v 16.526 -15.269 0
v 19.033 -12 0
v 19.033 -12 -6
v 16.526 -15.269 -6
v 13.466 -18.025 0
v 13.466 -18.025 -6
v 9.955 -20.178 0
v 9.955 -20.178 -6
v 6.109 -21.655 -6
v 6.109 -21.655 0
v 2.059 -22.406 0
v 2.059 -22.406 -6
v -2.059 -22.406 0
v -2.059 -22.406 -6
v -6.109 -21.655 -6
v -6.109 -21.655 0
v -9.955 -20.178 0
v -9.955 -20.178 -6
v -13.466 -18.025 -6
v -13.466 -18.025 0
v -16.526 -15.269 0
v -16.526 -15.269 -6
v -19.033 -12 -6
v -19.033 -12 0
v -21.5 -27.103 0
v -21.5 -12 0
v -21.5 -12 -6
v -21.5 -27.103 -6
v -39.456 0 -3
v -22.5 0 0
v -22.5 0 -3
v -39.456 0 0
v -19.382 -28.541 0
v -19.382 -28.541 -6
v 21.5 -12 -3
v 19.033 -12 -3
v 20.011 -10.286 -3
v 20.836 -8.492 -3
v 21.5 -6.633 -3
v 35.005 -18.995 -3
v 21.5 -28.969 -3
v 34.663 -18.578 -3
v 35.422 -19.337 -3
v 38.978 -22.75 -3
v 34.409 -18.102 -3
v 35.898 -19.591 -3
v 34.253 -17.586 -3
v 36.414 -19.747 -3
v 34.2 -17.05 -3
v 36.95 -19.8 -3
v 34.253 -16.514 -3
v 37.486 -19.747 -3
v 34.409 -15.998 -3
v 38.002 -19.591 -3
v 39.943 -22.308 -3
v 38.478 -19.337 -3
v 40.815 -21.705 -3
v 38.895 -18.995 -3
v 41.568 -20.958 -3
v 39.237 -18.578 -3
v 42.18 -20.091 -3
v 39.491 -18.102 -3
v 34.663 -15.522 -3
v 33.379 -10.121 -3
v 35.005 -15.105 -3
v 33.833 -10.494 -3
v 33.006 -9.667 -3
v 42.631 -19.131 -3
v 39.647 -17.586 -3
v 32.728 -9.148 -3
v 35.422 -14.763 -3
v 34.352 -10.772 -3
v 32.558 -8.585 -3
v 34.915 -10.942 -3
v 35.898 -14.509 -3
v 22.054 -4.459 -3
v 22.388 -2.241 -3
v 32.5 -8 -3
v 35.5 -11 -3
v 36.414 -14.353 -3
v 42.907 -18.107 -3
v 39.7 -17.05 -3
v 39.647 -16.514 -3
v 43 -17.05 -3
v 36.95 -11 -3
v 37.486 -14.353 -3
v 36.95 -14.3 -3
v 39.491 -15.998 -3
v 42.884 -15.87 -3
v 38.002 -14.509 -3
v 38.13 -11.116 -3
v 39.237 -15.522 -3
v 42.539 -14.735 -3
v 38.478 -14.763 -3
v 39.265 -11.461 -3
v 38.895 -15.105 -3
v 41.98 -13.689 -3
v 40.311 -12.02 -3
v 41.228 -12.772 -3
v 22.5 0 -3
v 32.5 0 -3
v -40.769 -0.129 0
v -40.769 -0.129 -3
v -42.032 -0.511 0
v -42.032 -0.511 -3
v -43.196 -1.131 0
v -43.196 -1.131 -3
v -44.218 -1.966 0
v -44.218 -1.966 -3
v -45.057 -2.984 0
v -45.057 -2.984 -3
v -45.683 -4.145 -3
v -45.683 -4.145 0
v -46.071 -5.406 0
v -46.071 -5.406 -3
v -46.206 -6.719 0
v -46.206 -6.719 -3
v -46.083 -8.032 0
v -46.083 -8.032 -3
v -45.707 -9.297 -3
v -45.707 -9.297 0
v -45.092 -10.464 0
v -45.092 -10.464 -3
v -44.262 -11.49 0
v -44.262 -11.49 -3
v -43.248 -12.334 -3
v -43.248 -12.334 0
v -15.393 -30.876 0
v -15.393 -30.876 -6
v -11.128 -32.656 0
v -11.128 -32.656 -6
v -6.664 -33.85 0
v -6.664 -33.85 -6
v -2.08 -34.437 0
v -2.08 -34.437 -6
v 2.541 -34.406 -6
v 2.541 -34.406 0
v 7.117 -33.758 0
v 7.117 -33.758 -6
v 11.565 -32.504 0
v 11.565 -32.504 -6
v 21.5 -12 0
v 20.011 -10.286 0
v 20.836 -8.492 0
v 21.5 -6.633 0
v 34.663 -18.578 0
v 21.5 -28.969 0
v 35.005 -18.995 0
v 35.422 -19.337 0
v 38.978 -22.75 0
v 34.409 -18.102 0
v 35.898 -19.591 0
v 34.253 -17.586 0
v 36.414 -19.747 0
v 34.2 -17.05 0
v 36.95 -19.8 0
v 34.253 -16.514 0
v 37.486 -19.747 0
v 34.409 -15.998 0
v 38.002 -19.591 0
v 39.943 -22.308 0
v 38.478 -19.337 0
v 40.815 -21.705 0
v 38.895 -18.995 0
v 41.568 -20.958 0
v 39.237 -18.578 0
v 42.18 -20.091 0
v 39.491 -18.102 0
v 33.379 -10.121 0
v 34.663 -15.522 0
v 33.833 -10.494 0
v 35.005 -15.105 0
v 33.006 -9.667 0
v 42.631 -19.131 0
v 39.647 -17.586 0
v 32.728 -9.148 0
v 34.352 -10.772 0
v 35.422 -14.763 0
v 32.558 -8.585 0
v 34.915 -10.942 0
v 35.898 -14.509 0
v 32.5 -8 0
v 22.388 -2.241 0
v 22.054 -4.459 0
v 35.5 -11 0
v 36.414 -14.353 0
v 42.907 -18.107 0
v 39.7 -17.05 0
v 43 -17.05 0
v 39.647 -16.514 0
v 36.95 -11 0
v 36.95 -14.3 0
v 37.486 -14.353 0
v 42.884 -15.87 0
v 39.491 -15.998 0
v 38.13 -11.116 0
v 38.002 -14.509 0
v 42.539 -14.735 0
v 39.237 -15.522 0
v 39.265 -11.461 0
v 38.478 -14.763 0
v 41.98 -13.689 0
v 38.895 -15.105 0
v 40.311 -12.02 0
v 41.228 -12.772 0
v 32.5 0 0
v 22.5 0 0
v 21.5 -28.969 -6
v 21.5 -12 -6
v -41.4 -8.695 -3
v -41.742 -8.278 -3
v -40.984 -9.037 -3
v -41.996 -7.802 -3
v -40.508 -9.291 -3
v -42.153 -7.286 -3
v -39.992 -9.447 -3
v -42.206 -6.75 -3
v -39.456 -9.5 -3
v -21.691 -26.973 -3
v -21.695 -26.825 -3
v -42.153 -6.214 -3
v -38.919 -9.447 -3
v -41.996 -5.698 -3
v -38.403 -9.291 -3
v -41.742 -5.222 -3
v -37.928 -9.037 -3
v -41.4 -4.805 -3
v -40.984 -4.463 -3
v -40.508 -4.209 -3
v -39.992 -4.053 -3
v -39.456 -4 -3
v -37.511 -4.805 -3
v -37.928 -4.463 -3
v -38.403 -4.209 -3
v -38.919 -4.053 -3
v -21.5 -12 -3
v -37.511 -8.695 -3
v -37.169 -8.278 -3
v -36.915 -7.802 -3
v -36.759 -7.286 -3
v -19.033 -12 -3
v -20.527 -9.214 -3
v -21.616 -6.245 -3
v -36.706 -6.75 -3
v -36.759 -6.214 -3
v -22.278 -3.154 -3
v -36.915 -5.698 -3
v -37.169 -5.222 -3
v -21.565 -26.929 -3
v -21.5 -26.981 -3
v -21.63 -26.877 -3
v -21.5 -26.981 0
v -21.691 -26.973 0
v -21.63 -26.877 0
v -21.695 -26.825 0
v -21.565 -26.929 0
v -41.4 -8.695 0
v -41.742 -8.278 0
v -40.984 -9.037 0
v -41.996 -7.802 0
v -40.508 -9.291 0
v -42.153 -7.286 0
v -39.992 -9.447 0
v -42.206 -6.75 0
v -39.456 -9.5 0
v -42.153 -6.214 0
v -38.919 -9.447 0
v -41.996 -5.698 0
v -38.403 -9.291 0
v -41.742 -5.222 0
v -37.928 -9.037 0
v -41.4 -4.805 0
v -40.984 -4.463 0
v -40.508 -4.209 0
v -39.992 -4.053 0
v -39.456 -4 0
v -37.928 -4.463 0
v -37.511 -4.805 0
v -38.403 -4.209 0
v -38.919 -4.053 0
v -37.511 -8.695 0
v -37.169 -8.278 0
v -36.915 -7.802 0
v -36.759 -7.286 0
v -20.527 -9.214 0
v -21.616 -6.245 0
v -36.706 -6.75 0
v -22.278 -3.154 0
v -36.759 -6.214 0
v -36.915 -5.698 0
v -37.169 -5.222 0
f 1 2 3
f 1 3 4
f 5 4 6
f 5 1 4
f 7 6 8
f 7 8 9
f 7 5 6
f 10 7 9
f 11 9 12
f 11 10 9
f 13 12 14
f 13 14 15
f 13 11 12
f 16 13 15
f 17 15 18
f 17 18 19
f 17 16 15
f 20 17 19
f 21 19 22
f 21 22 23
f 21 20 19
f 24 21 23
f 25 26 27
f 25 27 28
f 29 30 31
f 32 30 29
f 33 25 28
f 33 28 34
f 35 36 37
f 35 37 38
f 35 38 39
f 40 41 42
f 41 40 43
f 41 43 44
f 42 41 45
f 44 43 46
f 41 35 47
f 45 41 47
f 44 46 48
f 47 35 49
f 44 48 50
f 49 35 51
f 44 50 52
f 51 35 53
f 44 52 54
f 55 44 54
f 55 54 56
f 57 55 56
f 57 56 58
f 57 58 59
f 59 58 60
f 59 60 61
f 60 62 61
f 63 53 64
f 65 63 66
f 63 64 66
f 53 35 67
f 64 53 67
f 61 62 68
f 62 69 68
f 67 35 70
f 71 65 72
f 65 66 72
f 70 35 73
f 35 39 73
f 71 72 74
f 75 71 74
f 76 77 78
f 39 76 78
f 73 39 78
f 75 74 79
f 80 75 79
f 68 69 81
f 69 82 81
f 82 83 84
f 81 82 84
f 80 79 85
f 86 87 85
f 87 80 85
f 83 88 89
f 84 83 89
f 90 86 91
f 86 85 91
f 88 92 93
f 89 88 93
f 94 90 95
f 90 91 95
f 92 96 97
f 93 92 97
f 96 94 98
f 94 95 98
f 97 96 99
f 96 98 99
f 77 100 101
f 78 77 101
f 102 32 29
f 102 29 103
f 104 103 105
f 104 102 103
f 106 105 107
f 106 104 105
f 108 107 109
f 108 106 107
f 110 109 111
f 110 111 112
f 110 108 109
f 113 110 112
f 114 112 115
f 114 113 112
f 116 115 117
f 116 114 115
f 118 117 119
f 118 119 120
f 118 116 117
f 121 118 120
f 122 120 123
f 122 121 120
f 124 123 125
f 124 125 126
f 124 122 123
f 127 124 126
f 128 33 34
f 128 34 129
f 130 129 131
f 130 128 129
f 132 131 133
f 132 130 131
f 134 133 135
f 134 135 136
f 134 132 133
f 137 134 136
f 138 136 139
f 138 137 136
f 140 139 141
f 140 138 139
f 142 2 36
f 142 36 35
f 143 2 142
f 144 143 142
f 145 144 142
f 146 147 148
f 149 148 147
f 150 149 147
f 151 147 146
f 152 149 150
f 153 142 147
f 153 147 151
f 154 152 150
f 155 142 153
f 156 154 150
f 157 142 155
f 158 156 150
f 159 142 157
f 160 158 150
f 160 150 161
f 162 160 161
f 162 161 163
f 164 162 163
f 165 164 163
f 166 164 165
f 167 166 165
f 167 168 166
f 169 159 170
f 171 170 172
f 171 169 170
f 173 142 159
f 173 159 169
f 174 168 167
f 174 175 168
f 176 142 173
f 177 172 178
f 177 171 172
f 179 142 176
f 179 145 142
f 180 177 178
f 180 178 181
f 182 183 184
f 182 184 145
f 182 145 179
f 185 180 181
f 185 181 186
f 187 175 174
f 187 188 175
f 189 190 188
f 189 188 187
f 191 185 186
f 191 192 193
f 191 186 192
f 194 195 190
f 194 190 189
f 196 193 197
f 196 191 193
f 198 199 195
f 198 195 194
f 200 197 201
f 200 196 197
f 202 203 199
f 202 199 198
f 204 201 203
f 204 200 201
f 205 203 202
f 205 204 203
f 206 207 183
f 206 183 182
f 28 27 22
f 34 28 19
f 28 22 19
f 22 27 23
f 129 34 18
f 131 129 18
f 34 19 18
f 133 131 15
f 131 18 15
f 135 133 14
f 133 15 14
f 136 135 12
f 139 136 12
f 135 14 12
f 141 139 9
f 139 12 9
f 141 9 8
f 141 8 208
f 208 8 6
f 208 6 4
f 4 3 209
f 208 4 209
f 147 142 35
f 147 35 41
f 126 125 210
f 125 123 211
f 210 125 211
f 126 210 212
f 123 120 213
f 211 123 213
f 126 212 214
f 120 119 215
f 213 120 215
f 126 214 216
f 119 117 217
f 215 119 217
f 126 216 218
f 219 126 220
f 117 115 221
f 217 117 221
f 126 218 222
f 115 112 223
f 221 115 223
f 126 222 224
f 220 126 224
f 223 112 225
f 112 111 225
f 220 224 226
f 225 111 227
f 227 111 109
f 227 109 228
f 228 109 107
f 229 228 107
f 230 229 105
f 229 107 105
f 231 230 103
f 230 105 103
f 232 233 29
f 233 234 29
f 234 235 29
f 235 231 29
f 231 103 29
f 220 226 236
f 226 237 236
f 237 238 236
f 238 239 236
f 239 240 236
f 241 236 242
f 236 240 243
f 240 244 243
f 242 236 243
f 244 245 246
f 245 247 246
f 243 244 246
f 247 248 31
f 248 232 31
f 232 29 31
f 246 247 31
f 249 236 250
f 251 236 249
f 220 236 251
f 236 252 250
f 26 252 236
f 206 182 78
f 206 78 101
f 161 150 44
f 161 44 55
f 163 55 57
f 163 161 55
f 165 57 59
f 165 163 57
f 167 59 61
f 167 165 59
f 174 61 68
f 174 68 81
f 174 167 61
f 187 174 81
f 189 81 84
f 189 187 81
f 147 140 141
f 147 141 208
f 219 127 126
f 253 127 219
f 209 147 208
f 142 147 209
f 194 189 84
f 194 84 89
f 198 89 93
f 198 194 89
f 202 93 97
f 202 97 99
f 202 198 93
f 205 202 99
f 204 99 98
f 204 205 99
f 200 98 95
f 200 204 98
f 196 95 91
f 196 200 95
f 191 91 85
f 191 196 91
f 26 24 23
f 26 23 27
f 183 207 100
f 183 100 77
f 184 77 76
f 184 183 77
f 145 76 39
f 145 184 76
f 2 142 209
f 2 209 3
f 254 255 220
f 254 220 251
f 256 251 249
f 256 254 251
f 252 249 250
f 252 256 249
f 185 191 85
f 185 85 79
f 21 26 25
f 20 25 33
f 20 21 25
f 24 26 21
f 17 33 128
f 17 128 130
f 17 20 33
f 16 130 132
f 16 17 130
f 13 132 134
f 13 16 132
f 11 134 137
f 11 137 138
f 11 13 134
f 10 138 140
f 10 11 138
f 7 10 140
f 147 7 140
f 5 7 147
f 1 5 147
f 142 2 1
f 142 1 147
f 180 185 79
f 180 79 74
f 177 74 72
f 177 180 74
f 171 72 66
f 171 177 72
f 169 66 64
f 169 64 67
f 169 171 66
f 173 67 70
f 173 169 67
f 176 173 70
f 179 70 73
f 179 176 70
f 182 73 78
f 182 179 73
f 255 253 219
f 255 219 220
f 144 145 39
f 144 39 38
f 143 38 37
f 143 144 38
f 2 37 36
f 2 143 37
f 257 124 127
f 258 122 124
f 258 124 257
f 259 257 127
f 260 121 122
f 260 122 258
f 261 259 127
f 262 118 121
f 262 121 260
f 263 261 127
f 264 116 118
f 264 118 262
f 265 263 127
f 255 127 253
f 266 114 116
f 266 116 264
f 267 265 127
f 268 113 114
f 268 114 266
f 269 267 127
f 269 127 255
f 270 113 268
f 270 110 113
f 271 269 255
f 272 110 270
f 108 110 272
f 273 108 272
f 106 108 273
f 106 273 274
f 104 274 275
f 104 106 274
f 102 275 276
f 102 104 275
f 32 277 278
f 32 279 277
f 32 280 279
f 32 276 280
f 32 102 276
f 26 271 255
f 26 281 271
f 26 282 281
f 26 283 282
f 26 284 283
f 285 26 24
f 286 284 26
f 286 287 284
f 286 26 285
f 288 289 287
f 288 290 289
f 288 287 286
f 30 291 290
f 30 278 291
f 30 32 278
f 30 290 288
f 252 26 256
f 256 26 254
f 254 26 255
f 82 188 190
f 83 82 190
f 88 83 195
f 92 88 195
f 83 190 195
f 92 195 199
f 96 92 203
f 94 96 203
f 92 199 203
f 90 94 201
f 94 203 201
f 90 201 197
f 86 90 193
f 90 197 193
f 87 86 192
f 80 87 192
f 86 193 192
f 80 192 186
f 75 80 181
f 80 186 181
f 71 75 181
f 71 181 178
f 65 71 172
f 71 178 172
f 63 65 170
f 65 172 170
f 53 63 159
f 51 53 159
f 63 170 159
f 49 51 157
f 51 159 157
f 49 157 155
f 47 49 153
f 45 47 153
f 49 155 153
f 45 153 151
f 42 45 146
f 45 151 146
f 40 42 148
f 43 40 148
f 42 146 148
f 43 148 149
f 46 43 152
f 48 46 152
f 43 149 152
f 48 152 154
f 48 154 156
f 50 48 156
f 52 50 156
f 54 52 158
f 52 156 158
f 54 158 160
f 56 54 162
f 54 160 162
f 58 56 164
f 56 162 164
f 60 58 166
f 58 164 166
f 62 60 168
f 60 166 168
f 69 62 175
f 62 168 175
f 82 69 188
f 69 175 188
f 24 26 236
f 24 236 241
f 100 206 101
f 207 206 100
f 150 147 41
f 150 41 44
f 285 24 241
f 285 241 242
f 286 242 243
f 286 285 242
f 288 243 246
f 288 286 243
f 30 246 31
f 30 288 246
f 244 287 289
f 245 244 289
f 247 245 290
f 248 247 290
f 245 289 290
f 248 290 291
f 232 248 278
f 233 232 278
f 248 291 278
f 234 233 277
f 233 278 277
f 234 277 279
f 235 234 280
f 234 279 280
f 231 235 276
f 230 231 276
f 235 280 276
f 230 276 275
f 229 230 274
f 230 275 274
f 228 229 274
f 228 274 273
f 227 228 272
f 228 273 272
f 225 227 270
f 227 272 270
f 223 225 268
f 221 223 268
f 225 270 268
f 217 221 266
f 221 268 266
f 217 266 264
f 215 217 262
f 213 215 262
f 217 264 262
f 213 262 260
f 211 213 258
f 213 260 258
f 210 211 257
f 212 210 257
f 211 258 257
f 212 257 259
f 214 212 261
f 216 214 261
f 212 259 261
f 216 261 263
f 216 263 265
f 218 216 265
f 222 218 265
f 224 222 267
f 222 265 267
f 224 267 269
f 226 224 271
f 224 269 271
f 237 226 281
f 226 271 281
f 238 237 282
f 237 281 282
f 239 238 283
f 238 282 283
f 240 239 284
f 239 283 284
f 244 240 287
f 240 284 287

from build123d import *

# Parameters (mm, degrees)
F0_R     = 2.75
F1_DEPTH = 3
F2_DEPTH = 6


# Not quite as in the source:
# - a feature names something its author has since deleted; it is built from what else it names


with BuildPart() as f1:
    # F0 (on Top) → F1 (new body)
    with BuildSketch(Plane.XY):
        with BuildLine():
            ThreePointArc((-33.2160406839, -9.3244110423), (-34.0059545463, -5.8176503326), (-34.4267003209, -2.2477333057))
            ThreePointArc((-34.4267003209, -2.2477333057), (-36.7015374081, -0.5875004995), (-39.4558249578, 0))
            ThreePointArc((-39.4558249578, 0), (-45.9077806089, -4.7663749659), (-43.2479022167, -12.334142733))
            ThreePointArc((-43.2479022167, -12.334142733), (-37.5161243055, -13.215296697), (-33.2160406839, -9.3244110423))
        make_face()
        with Locations((-39.4558249578, -6.75)):
            Circle(F0_R, mode=Mode.SUBTRACT)
        with BuildLine():
            ThreePointArc((-21.6952147359, -26.8247582946), (-28.8162633149, -18.9703180935), (-33.2160406839, -9.3244110423))
            ThreePointArc((-33.2160406839, -9.3244110423), (-37.5161243055, -13.215296697), (-43.2479022167, -12.334142733))
            Line((-43.2479022167, -12.334142733), (-21.6914522522, -26.9726875554))
            Line((-21.6914522522, -26.9726875554), (-21.6952147359, -26.8247582946))
        make_face()
        with BuildLine():
            ThreePointArc((-32.7058249578, -6.75), (-33.1507043682, -4.3400302179), (-34.4267003209, -2.2477333057))
            ThreePointArc((-34.4267003209, -2.2477333057), (-34.0059545463, -5.8176503326), (-33.2160406839, -9.3244110423))
            ThreePointArc((-33.2160406839, -9.3244110423), (-32.8346074018, -8.0622416224), (-32.7058249578, -6.75))
        make_face()
        with BuildLine():
            ThreePointArc((-34.4267003209, -2.2477333057), (-34.4816702109, -1.1244640786), (-34.5, 0))
            Line((-34.5, 0), (-39.4558249578, 0))
            ThreePointArc((-39.4558249578, 0), (-36.7015374081, -0.5875004995), (-34.4267003209, -2.2477333057))
        make_face()
        with BuildLine():
            ThreePointArc((-19.0328663107, -12), (-21.6158447902, -6.2454186413), (-22.5, 0))
            Line((-22.5, 0), (-34.5, 0))
            ThreePointArc((-34.5, 0), (-34.4816702109, -1.1244640786), (-34.4267003209, -2.2477333057))
            ThreePointArc((-34.4267003209, -2.2477333057), (-33.1507043682, -4.3400302179), (-32.7058249578, -6.75))
            ThreePointArc((-32.7058249578, -6.75), (-32.8346074018, -8.0622416224), (-33.2160406839, -9.3244110423))
            ThreePointArc((-33.2160406839, -9.3244110423), (-28.8162633149, -18.9703180935), (-21.6952147359, -26.8247582946))
            ThreePointArc((-21.6952147359, -26.8247582946), (-21.5977495138, -26.9032937749), (-21.5, -26.9814751265))
            Line((-21.5, -26.9814751265), (-21.5, -12))
            Line((-21.5, -12), (-19.0328663107, -12))
        make_face()
    extrude(amount=-F1_DEPTH)


with BuildPart() as f1b:
    # F0 (on Top) → F1, piece 2 (new body)
    with BuildSketch(Plane.XY):
        with BuildLine():
            ThreePointArc((22.5, 0), (22.2485954613, -3.3541019663), (21.5, -6.6332495807))
            Line((21.5, -6.6332495807), (21.5, -12))
            Line((21.5, -12), (21.5, -26.9814751265))
            Line((21.5, -26.9814751265), (21.5, -28.9688625831))
            Line((21.5, -28.9688625831), (38.9781076545, -22.749936784))
            ThreePointArc((38.9781076545, -22.749936784), (30.9881581058, -18.0790487007), (36.95, -11))
            Line((36.95, -11), (35.5, -11))
            ThreePointArc((35.5, -11), (33.3786796564, -10.1213203436), (32.5, -8))
            Line((32.5, -8), (32.5, 0))
            Line((32.5, 0), (22.5, 0))
        make_face()
        with BuildLine():
            ThreePointArc((36.95, -11), (30.9881581058, -18.0790487007), (38.9781076545, -22.749936784))
            ThreePointArc((38.9781076545, -22.749936784), (41.8933061462, -20.5380115174), (43, -17.05))
            ThreePointArc((43, -17.05), (41.2279960262, -12.7720039738), (36.95, -11))
        make_face()
        with Locations((36.95, -17.05)):
            Circle(F0_R, mode=Mode.SUBTRACT)
        with BuildLine():
            ThreePointArc((21.5, -6.6332495807), (20.4433073488, -9.3979351266), (19.0328663107, -12))
            Line((19.0328663107, -12), (21.5, -12))
            Line((21.5, -12), (21.5, -6.6332495807))
        make_face()
    extrude(amount=-F1_DEPTH)


with BuildPart() as f2:
    # F0 (on Top) → F2 (new body)
    with BuildSketch(Plane.XY):
        with BuildLine():
            ThreePointArc((19.0328663107, -12), (0, -22.5), (-19.0328663107, -12))
            Line((-19.0328663107, -12), (-21.5, -12))
            Line((-21.5, -12), (-21.5, -26.9814751265))
            ThreePointArc((-21.5, -26.9814751265), (-20.4557349054, -27.7815210073), (-19.3817282119, -28.5411739688))
            ThreePointArc((-19.3817282119, -28.5411739688), (-4.3817701298, -34.220609149), (11.5652419965, -32.5037717436))
            ThreePointArc((11.5652419965, -32.5037717436), (16.7616078302, -30.1545768159), (21.5, -26.9814751265))
            Line((21.5, -26.9814751265), (21.5, -12))
            Line((21.5, -12), (19.0328663107, -12))
        make_face()
        with BuildLine():
            ThreePointArc((-19.3817282119, -28.5411739688), (-20.4557349054, -27.7815210073), (-21.5, -26.9814751265))
            Line((-21.5, -26.9814751265), (-21.5, -27.102698869))
            Line((-21.5, -27.102698869), (-19.3817282119, -28.5411739688))
        make_face()
        with BuildLine():
            Line((21.5, -28.9688625831), (21.5, -26.9814751265))
            ThreePointArc((21.5, -26.9814751265), (16.7616078302, -30.1545768159), (11.5652419965, -32.5037717436))
            Line((11.5652419965, -32.5037717436), (21.5, -28.9688625831))
        make_face()
    extrude(amount=-F2_DEPTH)


solid = Compound([f1.part, f1b.part, f2.part])
